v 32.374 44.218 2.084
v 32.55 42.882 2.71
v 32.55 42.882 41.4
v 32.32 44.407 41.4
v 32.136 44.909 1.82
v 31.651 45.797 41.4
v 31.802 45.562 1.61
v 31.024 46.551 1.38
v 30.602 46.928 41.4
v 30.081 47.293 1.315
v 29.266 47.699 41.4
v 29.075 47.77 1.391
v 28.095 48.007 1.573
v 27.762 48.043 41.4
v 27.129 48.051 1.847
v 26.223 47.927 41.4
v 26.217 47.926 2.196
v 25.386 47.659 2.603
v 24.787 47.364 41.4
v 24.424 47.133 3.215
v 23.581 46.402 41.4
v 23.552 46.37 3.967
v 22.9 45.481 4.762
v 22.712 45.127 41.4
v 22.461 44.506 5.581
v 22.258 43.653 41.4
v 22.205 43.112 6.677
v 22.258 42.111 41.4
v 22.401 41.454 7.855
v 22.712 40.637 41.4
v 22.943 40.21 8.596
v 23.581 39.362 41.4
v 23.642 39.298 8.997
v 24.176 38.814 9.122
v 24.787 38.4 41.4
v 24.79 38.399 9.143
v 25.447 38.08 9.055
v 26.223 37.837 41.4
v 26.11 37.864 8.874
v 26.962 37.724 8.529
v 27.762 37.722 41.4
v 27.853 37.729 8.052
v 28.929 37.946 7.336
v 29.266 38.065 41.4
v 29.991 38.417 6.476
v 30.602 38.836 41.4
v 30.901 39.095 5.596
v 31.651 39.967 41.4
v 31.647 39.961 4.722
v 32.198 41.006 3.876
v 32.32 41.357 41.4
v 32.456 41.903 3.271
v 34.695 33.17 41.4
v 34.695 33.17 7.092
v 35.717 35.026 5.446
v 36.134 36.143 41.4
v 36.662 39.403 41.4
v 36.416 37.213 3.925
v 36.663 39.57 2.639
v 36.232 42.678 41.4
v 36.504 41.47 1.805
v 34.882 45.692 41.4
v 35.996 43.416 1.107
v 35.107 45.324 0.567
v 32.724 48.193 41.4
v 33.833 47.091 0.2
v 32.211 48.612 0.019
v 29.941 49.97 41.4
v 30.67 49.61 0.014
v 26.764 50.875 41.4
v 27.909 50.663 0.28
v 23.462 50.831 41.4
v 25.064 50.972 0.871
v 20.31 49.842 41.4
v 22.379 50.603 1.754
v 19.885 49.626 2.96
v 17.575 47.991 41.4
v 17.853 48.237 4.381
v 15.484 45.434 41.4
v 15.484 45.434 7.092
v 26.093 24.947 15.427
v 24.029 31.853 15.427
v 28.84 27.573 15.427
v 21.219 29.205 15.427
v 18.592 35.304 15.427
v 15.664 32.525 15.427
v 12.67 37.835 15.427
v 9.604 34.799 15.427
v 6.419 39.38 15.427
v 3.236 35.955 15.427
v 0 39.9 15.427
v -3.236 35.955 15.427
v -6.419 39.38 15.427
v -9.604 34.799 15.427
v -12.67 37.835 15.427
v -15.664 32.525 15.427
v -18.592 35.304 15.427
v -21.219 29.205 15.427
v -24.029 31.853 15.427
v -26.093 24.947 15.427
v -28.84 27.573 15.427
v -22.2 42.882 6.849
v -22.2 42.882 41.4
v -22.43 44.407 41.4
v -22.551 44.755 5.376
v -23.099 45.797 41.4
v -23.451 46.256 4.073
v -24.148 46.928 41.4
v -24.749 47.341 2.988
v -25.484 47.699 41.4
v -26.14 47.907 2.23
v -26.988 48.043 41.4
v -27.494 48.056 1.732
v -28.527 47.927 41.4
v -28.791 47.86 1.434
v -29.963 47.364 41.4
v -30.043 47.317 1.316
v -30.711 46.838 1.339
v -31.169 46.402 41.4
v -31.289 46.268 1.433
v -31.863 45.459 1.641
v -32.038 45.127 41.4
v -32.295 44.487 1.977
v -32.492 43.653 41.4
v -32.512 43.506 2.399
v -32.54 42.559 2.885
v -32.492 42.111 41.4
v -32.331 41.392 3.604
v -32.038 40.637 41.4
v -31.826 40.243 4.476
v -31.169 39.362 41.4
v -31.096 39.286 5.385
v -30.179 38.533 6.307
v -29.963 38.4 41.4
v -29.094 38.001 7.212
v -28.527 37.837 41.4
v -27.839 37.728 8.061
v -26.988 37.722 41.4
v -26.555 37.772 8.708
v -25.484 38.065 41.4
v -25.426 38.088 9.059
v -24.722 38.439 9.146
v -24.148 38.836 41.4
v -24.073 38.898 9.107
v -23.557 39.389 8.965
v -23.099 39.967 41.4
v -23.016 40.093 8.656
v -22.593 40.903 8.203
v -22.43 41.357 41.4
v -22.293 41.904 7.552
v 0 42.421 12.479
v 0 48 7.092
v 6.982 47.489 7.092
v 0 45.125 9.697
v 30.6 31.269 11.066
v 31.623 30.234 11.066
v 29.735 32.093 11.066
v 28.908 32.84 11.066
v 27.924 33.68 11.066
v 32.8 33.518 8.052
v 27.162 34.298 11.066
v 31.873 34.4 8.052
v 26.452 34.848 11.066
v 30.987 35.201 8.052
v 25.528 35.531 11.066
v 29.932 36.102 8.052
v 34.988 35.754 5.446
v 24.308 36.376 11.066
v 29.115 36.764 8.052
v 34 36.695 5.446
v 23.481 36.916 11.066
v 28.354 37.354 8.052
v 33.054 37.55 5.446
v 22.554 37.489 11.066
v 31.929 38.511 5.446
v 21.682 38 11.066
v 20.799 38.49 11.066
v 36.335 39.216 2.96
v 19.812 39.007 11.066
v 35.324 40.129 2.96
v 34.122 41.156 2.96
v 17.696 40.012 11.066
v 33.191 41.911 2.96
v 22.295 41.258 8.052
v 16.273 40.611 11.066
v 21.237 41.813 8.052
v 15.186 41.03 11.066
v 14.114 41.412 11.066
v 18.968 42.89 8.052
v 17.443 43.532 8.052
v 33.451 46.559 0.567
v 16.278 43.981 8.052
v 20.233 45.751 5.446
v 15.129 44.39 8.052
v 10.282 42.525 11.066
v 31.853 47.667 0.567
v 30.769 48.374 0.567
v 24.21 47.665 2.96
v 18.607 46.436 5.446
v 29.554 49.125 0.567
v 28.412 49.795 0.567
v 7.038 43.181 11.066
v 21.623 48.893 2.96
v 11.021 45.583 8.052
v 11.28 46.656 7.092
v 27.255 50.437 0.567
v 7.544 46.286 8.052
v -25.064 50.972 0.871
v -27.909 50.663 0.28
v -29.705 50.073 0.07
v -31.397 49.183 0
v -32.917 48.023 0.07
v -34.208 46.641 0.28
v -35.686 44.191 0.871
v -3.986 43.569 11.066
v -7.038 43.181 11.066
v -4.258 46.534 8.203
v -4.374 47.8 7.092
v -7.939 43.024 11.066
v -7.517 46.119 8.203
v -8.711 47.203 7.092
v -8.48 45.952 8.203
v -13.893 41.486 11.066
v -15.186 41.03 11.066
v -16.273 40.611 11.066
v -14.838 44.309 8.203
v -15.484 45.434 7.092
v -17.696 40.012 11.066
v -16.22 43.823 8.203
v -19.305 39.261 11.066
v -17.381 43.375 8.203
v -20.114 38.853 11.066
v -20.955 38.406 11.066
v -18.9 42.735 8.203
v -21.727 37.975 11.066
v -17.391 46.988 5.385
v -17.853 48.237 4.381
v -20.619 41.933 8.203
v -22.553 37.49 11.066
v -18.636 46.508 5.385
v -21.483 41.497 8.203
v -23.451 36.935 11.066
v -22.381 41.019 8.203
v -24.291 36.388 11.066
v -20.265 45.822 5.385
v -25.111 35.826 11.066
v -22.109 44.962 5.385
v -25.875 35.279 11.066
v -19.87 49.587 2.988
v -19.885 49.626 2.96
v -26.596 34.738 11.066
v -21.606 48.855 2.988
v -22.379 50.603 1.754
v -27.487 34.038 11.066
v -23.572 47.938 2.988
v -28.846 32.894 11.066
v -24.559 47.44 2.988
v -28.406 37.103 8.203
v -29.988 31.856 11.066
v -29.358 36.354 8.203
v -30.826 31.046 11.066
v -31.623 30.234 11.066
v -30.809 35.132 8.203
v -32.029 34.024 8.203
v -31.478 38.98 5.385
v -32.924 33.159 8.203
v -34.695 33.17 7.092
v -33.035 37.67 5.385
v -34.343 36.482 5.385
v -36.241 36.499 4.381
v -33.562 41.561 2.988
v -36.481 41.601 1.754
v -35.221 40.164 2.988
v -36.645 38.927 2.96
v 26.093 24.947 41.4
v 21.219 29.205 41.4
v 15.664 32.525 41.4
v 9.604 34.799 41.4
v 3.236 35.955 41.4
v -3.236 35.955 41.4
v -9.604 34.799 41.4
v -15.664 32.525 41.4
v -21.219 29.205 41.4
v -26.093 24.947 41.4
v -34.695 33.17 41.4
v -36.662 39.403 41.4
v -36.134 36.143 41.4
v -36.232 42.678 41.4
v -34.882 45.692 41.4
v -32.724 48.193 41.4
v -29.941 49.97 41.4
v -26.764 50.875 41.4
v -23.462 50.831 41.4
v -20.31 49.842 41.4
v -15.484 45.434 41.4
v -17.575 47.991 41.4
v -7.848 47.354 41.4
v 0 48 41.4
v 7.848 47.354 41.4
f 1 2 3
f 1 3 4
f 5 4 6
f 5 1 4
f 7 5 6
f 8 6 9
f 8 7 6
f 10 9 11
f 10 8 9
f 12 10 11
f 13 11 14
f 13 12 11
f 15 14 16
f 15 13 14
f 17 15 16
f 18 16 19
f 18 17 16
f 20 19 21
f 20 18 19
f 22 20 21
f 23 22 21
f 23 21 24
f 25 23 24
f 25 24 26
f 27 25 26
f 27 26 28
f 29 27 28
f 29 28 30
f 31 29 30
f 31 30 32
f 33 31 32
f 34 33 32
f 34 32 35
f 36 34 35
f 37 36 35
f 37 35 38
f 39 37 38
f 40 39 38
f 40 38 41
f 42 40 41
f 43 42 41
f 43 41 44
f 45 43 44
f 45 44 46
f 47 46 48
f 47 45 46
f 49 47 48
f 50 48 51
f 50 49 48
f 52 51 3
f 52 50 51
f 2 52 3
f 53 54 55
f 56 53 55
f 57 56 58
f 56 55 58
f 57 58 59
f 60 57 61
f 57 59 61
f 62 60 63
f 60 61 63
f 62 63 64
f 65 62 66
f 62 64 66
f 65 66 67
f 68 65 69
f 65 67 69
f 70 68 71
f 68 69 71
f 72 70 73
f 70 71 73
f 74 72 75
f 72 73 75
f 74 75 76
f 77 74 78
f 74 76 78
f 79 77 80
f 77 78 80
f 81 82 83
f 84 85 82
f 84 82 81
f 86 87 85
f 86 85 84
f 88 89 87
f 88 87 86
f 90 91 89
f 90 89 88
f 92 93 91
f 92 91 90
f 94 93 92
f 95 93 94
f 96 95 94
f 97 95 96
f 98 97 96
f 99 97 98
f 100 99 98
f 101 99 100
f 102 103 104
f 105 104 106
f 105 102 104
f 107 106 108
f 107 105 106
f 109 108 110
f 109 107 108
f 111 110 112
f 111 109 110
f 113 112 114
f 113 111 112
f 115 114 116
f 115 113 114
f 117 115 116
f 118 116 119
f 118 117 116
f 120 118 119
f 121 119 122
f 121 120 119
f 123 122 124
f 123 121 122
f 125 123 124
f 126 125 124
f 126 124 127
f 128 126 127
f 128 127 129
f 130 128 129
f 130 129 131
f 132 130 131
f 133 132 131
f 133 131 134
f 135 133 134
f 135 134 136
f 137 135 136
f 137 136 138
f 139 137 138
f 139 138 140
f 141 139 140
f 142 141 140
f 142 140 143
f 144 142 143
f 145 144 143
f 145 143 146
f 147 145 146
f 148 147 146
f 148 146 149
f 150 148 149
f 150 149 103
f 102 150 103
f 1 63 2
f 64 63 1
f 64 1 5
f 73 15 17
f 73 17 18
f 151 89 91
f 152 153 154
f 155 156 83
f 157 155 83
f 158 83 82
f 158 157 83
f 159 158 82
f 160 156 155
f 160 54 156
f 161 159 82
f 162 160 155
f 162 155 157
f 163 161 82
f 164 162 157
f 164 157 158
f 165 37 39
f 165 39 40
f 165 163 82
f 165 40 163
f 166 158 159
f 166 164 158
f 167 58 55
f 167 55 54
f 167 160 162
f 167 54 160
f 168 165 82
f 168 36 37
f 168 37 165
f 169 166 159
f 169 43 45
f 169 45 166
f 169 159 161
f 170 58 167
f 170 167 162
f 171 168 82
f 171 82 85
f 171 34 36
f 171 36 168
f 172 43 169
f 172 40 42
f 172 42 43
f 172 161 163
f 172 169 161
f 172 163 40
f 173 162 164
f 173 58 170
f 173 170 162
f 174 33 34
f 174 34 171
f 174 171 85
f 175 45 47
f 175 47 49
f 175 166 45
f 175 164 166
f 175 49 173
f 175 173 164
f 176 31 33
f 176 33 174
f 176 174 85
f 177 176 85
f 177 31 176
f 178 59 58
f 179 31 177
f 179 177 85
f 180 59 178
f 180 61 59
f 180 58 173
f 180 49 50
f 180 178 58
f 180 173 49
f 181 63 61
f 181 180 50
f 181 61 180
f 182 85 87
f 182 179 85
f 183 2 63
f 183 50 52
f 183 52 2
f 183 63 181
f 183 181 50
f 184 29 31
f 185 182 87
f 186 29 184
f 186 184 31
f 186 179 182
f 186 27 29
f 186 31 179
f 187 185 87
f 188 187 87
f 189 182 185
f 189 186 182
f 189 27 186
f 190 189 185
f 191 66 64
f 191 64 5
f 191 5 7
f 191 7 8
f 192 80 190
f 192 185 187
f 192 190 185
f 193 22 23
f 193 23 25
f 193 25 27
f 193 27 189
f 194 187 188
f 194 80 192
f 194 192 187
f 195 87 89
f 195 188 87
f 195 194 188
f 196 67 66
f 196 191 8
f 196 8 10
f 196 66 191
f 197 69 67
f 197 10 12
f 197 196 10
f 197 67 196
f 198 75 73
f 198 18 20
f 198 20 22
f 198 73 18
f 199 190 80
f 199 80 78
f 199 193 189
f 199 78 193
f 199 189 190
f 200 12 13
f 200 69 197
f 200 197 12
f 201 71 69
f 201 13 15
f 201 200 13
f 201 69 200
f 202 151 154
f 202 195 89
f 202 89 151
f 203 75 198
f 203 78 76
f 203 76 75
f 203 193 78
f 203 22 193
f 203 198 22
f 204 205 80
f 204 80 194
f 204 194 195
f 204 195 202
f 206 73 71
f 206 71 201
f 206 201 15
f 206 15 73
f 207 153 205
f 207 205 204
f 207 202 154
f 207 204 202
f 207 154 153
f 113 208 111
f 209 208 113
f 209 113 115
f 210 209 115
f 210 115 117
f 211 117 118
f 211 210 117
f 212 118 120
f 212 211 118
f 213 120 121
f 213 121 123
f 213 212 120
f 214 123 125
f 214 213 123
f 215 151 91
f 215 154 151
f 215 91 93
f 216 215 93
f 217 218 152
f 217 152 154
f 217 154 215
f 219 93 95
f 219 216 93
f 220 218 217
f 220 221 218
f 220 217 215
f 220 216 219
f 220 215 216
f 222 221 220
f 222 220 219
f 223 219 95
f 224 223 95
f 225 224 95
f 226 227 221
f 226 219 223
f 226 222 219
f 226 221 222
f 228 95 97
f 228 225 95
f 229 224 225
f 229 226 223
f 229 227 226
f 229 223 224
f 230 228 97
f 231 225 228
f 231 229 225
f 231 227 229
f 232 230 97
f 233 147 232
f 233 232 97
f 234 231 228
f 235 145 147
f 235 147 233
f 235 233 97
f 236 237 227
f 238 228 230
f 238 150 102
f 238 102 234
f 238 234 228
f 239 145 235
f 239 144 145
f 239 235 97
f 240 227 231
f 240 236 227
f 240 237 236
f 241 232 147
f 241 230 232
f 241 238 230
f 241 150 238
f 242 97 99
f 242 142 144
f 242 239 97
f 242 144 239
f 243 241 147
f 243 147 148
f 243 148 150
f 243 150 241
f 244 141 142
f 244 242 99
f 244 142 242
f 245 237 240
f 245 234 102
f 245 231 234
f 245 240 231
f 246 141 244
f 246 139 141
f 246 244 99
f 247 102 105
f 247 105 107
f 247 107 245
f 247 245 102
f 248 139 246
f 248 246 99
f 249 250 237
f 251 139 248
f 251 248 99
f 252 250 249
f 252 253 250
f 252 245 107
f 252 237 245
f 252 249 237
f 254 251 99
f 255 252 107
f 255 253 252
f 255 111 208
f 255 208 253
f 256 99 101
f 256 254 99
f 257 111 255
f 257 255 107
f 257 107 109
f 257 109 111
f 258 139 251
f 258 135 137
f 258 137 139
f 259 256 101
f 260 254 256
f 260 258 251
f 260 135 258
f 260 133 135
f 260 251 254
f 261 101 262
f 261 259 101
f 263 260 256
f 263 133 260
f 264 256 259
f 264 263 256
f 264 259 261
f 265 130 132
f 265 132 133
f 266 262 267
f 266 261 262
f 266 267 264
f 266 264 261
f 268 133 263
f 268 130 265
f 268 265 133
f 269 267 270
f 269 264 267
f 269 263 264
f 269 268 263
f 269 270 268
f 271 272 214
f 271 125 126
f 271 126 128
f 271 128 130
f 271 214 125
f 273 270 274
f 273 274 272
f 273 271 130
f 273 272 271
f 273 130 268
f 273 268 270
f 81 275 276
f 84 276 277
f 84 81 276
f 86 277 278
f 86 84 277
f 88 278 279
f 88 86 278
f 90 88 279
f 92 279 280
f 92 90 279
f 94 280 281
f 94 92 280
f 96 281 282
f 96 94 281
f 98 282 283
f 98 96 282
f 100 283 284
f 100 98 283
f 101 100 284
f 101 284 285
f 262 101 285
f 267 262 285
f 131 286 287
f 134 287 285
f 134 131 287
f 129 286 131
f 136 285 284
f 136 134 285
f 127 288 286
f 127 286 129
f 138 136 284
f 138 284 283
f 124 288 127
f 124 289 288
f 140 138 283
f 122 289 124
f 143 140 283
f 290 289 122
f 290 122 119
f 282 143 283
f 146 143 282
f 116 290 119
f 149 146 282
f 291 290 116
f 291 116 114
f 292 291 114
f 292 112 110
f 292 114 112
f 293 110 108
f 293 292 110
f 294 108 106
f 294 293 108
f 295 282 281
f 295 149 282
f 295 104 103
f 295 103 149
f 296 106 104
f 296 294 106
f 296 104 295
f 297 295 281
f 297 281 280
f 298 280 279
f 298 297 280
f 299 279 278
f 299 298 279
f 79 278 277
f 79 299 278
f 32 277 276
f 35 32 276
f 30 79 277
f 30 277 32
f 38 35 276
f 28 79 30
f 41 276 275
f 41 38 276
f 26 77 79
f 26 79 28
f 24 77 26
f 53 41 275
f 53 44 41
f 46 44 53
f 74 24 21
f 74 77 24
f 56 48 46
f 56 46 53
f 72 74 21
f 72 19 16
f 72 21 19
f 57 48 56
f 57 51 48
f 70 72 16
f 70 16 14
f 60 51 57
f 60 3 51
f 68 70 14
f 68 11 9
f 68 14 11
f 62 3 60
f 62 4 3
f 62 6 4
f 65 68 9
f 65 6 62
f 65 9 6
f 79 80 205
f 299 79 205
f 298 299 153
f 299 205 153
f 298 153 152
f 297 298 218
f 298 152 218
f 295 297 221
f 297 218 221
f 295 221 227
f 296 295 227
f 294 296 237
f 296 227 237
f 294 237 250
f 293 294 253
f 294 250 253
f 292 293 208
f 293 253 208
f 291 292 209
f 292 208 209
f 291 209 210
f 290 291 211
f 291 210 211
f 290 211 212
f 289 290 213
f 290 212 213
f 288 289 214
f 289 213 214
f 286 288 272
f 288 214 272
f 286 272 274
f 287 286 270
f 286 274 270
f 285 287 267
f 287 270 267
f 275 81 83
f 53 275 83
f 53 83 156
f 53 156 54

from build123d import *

# Parameters (mm, degrees)
SKETCH004_R  = 5.175
PAD002_DEPTH = 41.4


with BuildPart() as chamfer_cutout_left:
    # Sketch005 → Revolution001 (revolve)
    with BuildSketch(Plane.YZ):
        with BuildLine():
            Line((36.1, 15.427249), (39.9, 15.427249))
            ThreePointArc((39.9, 15.427249), (48.355241, 6.793042), (58.35, 0))
            Line((58.35, 0), (58.35, -5))
            Line((58.35, -5), (36.1, -5))
            Line((36.1, -5), (36.1, 15.427249))
        make_face()
    revolve(axis=Axis((0, 0, 0), (0, 0, 1)))


with BuildPart() as spacer_left:
    # Sketch004 → Pad002 (new body)
    with BuildSketch(Plane.XY):
        with BuildLine():
            ThreePointArc((-15.484484, 45.433806), (-31.397174, 49.18272), (-34.694729, 33.170405))
            Line((-26.093327, 24.946909), (-34.694729, 33.170405))
            ThreePointArc((26.093327, 24.946909), (0, 36.1), (-26.093327, 24.946909))
            Line((26.093327, 24.946909), (34.694729, 33.170405))
            ThreePointArc((34.694729, 33.170405), (31.397174, 49.18272), (15.484484, 45.433806))
            ThreePointArc((15.484484, 45.433806), (0, 48), (-15.484484, 45.433806))
        make_face()
        with Locations((-27.375, 42.882106)):
            Circle(SKETCH004_R, mode=Mode.SUBTRACT)
        with Locations((27.375, 42.882106)):
            Circle(SKETCH004_R, mode=Mode.SUBTRACT)
    extrude(amount=PAD002_DEPTH)

    # Cut001: cut chamfer_cutout_left
    add(chamfer_cutout_left.part, mode=Mode.SUBTRACT)


solid = spacer_left.part
